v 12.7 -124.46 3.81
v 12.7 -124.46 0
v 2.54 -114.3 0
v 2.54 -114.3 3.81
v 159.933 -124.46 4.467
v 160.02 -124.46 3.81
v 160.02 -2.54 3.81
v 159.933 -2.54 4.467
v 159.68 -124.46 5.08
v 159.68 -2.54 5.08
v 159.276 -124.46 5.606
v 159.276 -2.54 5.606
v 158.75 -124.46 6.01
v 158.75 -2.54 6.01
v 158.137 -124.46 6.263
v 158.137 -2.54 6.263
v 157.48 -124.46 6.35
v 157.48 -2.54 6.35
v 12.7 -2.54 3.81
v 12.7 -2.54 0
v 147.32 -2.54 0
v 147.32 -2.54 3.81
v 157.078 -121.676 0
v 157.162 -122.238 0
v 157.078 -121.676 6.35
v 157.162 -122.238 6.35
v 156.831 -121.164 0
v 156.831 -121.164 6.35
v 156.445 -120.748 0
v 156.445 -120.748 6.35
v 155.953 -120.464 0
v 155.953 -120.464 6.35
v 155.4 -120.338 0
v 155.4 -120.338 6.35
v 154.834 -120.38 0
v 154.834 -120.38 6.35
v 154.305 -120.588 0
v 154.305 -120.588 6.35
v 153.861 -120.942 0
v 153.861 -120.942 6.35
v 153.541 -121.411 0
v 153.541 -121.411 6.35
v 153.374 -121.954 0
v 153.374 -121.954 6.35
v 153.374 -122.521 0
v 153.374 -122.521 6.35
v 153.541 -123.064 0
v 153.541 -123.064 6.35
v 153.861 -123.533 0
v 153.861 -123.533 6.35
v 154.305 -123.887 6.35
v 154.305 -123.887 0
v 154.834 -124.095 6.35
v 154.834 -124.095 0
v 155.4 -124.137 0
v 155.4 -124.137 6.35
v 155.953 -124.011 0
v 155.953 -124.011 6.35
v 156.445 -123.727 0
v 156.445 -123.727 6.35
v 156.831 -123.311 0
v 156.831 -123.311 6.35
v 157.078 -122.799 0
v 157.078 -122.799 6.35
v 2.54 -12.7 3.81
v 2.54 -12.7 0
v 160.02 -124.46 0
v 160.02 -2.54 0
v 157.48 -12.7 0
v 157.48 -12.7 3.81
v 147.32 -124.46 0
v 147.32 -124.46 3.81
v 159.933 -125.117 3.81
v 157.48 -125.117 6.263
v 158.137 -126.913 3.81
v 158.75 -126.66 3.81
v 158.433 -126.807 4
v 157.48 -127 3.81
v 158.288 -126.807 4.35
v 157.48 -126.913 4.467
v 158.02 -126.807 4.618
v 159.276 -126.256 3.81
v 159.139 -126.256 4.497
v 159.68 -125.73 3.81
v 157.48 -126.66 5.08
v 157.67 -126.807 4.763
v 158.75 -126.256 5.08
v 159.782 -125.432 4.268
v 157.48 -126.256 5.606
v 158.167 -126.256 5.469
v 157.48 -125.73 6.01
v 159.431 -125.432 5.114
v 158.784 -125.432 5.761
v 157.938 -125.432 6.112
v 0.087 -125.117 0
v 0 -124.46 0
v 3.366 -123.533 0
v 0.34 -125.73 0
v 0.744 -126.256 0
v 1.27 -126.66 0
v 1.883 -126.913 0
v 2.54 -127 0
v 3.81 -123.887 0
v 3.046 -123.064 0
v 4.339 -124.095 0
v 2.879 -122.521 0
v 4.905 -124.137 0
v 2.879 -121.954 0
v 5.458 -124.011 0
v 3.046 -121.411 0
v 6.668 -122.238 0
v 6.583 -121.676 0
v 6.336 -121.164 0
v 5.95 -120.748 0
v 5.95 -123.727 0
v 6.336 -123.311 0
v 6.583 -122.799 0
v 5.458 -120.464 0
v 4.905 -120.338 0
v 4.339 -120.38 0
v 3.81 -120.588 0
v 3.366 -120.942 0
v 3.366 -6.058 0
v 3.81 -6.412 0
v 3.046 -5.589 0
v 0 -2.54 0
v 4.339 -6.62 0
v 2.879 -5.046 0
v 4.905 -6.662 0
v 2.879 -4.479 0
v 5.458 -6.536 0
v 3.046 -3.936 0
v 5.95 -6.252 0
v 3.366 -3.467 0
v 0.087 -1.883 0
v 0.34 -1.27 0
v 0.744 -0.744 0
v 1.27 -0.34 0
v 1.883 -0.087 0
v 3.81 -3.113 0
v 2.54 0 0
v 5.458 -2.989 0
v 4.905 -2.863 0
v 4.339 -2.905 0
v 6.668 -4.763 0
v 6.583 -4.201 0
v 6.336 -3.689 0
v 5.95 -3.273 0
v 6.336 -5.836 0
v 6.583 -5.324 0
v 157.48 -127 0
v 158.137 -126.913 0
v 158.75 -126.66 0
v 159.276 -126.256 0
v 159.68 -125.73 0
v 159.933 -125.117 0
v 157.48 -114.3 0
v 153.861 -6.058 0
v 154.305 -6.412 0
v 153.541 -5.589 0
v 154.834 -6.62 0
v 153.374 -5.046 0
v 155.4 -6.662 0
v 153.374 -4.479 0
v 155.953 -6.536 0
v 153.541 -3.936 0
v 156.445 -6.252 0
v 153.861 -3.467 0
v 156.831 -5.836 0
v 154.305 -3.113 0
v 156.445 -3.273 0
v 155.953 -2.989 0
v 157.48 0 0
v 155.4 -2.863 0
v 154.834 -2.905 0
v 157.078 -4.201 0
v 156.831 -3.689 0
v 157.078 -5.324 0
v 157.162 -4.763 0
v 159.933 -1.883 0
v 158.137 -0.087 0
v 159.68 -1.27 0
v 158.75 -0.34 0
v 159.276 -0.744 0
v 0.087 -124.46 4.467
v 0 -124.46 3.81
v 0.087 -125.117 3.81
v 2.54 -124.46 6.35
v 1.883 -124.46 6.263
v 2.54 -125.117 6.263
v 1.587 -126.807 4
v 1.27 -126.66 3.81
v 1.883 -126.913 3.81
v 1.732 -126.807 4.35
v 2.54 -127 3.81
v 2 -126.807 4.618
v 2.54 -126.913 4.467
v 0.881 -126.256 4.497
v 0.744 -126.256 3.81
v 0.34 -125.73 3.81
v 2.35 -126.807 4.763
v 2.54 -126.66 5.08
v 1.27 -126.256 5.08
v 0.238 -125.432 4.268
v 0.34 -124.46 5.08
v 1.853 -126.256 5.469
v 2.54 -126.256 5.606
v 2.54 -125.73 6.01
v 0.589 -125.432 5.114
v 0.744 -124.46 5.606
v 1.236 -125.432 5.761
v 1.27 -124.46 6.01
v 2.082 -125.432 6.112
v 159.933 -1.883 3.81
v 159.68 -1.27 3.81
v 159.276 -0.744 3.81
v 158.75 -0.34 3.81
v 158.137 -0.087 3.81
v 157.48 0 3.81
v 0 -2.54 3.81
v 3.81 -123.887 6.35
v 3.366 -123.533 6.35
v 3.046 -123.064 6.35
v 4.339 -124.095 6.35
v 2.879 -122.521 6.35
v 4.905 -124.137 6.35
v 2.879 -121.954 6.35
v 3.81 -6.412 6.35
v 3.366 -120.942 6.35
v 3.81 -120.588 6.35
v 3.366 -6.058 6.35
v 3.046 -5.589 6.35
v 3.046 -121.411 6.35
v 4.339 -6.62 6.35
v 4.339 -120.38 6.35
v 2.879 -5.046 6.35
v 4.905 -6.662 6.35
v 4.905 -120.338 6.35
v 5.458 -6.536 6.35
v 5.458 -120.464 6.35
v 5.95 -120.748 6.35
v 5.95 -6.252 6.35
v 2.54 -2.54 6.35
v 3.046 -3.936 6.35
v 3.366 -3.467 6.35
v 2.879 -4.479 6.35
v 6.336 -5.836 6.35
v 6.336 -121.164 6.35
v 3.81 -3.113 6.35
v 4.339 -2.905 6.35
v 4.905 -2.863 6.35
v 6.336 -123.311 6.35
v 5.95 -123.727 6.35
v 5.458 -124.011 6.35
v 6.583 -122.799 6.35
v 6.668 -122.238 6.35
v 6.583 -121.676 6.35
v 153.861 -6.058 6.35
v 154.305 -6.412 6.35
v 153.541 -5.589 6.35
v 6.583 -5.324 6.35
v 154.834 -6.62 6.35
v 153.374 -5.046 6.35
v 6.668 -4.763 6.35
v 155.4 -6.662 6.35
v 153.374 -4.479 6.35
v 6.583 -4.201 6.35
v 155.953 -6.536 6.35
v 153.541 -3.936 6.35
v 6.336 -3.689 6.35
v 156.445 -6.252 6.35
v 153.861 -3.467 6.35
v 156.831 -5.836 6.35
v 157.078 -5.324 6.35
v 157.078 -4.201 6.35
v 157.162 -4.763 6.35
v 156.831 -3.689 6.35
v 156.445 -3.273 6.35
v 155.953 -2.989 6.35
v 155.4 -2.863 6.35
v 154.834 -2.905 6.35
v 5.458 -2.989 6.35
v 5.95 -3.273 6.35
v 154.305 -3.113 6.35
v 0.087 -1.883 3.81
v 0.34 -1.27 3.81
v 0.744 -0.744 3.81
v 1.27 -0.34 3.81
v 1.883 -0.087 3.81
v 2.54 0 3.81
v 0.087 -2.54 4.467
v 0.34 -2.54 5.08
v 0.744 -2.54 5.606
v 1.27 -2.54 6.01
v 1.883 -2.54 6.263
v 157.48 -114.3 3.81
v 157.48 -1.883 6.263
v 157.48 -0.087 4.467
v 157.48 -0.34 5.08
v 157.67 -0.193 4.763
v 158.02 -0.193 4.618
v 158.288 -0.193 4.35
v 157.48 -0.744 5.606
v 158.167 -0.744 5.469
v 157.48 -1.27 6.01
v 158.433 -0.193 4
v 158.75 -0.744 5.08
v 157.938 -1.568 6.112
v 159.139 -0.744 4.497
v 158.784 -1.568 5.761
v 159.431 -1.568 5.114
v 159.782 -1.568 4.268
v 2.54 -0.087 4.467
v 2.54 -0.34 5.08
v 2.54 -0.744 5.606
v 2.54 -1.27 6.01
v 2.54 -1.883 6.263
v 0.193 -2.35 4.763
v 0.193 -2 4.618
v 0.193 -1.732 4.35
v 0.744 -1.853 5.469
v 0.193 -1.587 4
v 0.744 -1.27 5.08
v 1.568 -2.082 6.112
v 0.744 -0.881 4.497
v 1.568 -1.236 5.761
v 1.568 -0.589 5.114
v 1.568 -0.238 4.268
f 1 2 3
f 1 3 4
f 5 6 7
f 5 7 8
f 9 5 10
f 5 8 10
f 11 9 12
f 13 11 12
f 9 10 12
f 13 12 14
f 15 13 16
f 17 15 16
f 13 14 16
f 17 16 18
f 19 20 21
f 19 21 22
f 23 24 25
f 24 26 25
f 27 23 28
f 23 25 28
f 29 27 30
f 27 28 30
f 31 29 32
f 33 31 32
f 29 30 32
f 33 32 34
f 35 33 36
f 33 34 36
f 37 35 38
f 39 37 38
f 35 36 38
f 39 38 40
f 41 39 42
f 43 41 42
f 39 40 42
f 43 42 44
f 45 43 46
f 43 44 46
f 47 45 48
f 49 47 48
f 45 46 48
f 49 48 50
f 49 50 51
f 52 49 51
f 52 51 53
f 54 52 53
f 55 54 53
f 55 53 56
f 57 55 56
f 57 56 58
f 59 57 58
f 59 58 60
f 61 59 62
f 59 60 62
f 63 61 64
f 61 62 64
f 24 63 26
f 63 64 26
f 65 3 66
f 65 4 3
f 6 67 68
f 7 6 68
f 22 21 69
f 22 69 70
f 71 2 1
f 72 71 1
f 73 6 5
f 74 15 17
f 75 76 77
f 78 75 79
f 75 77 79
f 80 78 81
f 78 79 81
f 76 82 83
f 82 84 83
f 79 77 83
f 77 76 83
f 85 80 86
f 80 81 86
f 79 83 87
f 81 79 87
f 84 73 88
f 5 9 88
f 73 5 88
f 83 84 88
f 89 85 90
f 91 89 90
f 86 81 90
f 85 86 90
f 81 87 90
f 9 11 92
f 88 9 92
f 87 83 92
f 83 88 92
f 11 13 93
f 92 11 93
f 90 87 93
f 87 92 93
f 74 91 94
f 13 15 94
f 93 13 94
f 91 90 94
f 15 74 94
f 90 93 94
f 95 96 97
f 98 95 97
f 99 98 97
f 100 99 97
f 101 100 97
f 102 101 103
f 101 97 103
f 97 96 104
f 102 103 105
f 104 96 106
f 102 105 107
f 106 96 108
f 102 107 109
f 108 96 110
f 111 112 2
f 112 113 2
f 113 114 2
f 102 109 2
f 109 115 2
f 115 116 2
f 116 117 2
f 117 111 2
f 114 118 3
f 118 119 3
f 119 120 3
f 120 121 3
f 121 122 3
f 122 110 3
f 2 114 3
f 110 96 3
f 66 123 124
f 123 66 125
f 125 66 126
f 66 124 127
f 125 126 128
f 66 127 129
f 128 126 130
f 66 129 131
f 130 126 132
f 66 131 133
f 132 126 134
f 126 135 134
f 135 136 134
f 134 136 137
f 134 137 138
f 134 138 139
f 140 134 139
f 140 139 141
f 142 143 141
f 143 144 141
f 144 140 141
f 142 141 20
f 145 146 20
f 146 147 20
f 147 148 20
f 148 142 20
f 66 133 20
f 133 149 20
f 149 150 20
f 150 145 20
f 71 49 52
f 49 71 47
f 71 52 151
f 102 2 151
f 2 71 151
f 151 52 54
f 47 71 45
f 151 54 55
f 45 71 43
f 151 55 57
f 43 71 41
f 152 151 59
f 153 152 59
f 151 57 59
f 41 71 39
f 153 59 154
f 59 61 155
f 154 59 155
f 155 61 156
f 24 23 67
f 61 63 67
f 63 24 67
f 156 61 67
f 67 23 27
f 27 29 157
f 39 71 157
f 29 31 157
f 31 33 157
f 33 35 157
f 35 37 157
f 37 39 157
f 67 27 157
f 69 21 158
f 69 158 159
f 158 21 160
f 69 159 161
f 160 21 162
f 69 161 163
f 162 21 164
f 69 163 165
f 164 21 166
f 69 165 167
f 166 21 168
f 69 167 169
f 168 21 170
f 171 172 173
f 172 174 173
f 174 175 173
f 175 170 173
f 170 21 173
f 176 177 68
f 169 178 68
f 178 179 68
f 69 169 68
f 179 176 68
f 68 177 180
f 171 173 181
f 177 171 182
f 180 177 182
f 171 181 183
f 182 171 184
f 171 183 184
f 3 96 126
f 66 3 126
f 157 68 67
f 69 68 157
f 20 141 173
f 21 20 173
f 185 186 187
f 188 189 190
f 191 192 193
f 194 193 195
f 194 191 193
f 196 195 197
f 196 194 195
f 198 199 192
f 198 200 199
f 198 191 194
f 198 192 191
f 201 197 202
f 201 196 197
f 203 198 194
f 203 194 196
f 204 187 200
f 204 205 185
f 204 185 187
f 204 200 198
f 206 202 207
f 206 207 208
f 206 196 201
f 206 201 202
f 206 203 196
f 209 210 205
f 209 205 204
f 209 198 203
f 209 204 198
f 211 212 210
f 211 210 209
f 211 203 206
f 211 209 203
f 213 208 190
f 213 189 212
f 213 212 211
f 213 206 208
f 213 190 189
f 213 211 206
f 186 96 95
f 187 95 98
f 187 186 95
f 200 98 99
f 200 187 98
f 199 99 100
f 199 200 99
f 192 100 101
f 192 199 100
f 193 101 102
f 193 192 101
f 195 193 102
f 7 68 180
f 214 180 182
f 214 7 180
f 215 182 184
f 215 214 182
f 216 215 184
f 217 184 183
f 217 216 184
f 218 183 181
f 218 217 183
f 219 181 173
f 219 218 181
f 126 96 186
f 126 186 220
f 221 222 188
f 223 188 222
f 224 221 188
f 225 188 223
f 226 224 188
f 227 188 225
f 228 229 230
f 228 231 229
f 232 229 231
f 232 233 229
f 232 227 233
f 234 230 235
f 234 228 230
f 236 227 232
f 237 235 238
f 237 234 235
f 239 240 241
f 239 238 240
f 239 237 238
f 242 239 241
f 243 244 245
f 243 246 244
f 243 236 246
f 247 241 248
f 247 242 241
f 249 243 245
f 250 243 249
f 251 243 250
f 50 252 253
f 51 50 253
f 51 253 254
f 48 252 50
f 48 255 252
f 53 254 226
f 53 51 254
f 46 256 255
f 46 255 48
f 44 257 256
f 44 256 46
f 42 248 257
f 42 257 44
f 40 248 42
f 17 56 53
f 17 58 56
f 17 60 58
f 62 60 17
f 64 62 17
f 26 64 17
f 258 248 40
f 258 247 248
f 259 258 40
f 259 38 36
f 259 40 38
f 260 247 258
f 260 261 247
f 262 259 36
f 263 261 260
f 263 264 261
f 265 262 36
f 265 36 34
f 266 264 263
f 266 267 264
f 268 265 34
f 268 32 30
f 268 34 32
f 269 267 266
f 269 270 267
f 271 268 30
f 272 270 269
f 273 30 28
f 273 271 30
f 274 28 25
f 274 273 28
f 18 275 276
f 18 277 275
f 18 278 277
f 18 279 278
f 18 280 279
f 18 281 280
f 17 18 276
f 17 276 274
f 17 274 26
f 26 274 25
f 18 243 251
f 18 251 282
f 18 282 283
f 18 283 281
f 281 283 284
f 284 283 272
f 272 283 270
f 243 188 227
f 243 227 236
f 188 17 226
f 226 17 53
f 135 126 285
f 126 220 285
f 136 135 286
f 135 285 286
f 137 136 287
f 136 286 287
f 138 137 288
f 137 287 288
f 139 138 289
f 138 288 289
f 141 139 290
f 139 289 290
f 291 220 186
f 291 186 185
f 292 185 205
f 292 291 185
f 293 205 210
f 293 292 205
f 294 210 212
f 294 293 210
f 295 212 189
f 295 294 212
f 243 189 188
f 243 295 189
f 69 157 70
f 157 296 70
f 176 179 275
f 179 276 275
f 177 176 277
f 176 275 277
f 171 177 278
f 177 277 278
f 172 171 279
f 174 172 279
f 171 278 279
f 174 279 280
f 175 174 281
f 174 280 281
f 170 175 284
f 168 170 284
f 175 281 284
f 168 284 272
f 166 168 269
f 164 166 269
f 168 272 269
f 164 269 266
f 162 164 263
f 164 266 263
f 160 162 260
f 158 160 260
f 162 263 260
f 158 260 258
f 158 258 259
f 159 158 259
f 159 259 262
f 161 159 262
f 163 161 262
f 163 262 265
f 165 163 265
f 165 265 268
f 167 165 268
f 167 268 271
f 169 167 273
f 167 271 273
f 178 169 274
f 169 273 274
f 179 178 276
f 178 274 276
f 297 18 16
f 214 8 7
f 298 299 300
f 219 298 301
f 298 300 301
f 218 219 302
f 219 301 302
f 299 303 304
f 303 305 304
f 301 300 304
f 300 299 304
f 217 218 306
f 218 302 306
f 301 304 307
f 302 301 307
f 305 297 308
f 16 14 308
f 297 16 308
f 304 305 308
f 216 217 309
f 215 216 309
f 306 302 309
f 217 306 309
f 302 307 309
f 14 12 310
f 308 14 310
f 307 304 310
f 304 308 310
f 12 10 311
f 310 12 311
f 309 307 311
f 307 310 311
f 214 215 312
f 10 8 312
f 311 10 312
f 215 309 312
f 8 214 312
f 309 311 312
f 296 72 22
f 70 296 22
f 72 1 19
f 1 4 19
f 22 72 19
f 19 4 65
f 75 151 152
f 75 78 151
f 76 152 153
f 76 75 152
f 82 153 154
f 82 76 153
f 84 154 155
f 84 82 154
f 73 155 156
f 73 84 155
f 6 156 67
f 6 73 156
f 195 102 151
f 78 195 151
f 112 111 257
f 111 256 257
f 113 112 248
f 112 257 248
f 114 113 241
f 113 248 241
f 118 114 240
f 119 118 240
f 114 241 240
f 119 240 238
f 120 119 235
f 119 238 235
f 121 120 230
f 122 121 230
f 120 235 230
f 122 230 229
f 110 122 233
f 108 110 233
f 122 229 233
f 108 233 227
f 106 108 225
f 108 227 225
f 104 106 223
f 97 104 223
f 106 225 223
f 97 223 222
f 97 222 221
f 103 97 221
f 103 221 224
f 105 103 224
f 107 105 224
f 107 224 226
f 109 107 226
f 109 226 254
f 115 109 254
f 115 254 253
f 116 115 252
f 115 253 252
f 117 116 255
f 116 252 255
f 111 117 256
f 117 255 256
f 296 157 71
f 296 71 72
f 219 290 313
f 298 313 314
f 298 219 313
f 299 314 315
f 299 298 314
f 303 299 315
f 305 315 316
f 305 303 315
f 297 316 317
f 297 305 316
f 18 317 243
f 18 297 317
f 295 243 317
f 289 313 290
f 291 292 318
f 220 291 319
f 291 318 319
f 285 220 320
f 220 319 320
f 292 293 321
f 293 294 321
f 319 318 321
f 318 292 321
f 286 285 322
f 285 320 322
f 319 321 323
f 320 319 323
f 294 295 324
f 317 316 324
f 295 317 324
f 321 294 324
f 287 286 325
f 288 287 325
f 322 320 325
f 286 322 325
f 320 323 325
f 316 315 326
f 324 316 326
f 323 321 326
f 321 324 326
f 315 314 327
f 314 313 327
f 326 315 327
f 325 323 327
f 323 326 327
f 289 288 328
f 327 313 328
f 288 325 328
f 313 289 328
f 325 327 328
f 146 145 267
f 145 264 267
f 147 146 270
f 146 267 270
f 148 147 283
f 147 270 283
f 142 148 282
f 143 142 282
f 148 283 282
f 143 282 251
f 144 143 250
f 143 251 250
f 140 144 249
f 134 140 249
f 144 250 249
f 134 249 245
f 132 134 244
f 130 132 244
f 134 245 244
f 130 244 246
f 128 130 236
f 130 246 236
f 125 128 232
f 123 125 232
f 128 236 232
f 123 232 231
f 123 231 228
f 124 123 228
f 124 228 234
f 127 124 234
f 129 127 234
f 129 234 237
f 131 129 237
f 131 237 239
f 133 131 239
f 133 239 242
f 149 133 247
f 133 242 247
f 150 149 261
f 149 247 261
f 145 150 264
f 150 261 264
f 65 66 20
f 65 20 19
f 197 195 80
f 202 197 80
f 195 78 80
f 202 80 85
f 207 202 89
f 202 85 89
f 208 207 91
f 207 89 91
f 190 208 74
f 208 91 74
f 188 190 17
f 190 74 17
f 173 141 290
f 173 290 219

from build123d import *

# Parameters (mm, degrees)
SKETCH1_W                        = 160.02
SKETCH1_H                        = 127
BOSS_EXTRUDE1_DEPTH              = 6.35
FILLET1_R                        = 2.54
SHELL1_START                     = 2.54
SHELL1_OUTLINE_W                 = 121.92
SHELL1_OUTLINE_H                 = 3.81
SHELL1_DEPTH                     = 154.94
CHAMFER1_SIZE                    = 10.16
F_9_64_0_15_DIAMETER_HOLE1_D     = 3.81
F_9_64_0_15_DIAMETER_HOLE1_DEPTH = 6.35
F_9_64_0_15_DIAMETER_HOLE1_TIP   = 1.144639479


# Read off the part's stored shape, not the designer's step: Shell1
with BuildPart() as part:
    # Sketch1 → Boss-Extrude1 (new body)
    with BuildSketch(Plane.XY):
        with Locations((80.01, -63.5)):
            Rectangle(SKETCH1_W, SKETCH1_H)
    extrude(amount=BOSS_EXTRUDE1_DEPTH)

    # Fillet1
    fillet1_edges = [part.edges().sort_by_distance(p)[0] for p in [
        (160.02, -63.5, 6.35),
        (80.01, 0, 6.35),
        (0, -63.5, 6.35),
        (0, 0, 3.175),
        (160.02, 0, 3.175),
        (160.02, -127, 3.175),
        (0, -127, 3.175),
        (80.01, -127, 6.35),
    ]]
    fillet(fillet1_edges, radius=FILLET1_R)

    # Shell1 outline → Shell1 (cut)
    with BuildSketch(Plane.YZ.offset(SHELL1_START)):
        with Locations((-63.5, 1.905)):
            Rectangle(SHELL1_OUTLINE_W, SHELL1_OUTLINE_H)
    extrude(amount=SHELL1_DEPTH, mode=Mode.SUBTRACT)

    # Chamfer1
    chamfer1_edges = [part.edges().sort_by_distance(p)[0] for p in [
        (2.54, -2.54, 1.905),
        (2.54, -124.46, 1.905),
        (157.48, -124.46, 1.905),
        (157.48, -2.54, 1.905),
    ]]
    chamfer(chamfer1_edges, length=CHAMFER1_SIZE)

    # 9/64 (0.15) Diameter Hole1
    with Locations(Plane(origin=(0, 0, 0), x_dir=(-1, 0, 0), z_dir=(0, 0, -1))):
        with Locations((-155.2575, -4.7625), (-4.7625, -4.7625), (-4.7625, -122.2375), (-155.2575, -122.2375)):
            Hole(F_9_64_0_15_DIAMETER_HOLE1_D / 2, depth=F_9_64_0_15_DIAMETER_HOLE1_DEPTH)
            with Locations((0, 0, -(F_9_64_0_15_DIAMETER_HOLE1_DEPTH + F_9_64_0_15_DIAMETER_HOLE1_TIP / 2))):  # 118° drill point
                Cone(0, F_9_64_0_15_DIAMETER_HOLE1_D / 2, F_9_64_0_15_DIAMETER_HOLE1_TIP, mode=Mode.SUBTRACT)


solid = part.part
